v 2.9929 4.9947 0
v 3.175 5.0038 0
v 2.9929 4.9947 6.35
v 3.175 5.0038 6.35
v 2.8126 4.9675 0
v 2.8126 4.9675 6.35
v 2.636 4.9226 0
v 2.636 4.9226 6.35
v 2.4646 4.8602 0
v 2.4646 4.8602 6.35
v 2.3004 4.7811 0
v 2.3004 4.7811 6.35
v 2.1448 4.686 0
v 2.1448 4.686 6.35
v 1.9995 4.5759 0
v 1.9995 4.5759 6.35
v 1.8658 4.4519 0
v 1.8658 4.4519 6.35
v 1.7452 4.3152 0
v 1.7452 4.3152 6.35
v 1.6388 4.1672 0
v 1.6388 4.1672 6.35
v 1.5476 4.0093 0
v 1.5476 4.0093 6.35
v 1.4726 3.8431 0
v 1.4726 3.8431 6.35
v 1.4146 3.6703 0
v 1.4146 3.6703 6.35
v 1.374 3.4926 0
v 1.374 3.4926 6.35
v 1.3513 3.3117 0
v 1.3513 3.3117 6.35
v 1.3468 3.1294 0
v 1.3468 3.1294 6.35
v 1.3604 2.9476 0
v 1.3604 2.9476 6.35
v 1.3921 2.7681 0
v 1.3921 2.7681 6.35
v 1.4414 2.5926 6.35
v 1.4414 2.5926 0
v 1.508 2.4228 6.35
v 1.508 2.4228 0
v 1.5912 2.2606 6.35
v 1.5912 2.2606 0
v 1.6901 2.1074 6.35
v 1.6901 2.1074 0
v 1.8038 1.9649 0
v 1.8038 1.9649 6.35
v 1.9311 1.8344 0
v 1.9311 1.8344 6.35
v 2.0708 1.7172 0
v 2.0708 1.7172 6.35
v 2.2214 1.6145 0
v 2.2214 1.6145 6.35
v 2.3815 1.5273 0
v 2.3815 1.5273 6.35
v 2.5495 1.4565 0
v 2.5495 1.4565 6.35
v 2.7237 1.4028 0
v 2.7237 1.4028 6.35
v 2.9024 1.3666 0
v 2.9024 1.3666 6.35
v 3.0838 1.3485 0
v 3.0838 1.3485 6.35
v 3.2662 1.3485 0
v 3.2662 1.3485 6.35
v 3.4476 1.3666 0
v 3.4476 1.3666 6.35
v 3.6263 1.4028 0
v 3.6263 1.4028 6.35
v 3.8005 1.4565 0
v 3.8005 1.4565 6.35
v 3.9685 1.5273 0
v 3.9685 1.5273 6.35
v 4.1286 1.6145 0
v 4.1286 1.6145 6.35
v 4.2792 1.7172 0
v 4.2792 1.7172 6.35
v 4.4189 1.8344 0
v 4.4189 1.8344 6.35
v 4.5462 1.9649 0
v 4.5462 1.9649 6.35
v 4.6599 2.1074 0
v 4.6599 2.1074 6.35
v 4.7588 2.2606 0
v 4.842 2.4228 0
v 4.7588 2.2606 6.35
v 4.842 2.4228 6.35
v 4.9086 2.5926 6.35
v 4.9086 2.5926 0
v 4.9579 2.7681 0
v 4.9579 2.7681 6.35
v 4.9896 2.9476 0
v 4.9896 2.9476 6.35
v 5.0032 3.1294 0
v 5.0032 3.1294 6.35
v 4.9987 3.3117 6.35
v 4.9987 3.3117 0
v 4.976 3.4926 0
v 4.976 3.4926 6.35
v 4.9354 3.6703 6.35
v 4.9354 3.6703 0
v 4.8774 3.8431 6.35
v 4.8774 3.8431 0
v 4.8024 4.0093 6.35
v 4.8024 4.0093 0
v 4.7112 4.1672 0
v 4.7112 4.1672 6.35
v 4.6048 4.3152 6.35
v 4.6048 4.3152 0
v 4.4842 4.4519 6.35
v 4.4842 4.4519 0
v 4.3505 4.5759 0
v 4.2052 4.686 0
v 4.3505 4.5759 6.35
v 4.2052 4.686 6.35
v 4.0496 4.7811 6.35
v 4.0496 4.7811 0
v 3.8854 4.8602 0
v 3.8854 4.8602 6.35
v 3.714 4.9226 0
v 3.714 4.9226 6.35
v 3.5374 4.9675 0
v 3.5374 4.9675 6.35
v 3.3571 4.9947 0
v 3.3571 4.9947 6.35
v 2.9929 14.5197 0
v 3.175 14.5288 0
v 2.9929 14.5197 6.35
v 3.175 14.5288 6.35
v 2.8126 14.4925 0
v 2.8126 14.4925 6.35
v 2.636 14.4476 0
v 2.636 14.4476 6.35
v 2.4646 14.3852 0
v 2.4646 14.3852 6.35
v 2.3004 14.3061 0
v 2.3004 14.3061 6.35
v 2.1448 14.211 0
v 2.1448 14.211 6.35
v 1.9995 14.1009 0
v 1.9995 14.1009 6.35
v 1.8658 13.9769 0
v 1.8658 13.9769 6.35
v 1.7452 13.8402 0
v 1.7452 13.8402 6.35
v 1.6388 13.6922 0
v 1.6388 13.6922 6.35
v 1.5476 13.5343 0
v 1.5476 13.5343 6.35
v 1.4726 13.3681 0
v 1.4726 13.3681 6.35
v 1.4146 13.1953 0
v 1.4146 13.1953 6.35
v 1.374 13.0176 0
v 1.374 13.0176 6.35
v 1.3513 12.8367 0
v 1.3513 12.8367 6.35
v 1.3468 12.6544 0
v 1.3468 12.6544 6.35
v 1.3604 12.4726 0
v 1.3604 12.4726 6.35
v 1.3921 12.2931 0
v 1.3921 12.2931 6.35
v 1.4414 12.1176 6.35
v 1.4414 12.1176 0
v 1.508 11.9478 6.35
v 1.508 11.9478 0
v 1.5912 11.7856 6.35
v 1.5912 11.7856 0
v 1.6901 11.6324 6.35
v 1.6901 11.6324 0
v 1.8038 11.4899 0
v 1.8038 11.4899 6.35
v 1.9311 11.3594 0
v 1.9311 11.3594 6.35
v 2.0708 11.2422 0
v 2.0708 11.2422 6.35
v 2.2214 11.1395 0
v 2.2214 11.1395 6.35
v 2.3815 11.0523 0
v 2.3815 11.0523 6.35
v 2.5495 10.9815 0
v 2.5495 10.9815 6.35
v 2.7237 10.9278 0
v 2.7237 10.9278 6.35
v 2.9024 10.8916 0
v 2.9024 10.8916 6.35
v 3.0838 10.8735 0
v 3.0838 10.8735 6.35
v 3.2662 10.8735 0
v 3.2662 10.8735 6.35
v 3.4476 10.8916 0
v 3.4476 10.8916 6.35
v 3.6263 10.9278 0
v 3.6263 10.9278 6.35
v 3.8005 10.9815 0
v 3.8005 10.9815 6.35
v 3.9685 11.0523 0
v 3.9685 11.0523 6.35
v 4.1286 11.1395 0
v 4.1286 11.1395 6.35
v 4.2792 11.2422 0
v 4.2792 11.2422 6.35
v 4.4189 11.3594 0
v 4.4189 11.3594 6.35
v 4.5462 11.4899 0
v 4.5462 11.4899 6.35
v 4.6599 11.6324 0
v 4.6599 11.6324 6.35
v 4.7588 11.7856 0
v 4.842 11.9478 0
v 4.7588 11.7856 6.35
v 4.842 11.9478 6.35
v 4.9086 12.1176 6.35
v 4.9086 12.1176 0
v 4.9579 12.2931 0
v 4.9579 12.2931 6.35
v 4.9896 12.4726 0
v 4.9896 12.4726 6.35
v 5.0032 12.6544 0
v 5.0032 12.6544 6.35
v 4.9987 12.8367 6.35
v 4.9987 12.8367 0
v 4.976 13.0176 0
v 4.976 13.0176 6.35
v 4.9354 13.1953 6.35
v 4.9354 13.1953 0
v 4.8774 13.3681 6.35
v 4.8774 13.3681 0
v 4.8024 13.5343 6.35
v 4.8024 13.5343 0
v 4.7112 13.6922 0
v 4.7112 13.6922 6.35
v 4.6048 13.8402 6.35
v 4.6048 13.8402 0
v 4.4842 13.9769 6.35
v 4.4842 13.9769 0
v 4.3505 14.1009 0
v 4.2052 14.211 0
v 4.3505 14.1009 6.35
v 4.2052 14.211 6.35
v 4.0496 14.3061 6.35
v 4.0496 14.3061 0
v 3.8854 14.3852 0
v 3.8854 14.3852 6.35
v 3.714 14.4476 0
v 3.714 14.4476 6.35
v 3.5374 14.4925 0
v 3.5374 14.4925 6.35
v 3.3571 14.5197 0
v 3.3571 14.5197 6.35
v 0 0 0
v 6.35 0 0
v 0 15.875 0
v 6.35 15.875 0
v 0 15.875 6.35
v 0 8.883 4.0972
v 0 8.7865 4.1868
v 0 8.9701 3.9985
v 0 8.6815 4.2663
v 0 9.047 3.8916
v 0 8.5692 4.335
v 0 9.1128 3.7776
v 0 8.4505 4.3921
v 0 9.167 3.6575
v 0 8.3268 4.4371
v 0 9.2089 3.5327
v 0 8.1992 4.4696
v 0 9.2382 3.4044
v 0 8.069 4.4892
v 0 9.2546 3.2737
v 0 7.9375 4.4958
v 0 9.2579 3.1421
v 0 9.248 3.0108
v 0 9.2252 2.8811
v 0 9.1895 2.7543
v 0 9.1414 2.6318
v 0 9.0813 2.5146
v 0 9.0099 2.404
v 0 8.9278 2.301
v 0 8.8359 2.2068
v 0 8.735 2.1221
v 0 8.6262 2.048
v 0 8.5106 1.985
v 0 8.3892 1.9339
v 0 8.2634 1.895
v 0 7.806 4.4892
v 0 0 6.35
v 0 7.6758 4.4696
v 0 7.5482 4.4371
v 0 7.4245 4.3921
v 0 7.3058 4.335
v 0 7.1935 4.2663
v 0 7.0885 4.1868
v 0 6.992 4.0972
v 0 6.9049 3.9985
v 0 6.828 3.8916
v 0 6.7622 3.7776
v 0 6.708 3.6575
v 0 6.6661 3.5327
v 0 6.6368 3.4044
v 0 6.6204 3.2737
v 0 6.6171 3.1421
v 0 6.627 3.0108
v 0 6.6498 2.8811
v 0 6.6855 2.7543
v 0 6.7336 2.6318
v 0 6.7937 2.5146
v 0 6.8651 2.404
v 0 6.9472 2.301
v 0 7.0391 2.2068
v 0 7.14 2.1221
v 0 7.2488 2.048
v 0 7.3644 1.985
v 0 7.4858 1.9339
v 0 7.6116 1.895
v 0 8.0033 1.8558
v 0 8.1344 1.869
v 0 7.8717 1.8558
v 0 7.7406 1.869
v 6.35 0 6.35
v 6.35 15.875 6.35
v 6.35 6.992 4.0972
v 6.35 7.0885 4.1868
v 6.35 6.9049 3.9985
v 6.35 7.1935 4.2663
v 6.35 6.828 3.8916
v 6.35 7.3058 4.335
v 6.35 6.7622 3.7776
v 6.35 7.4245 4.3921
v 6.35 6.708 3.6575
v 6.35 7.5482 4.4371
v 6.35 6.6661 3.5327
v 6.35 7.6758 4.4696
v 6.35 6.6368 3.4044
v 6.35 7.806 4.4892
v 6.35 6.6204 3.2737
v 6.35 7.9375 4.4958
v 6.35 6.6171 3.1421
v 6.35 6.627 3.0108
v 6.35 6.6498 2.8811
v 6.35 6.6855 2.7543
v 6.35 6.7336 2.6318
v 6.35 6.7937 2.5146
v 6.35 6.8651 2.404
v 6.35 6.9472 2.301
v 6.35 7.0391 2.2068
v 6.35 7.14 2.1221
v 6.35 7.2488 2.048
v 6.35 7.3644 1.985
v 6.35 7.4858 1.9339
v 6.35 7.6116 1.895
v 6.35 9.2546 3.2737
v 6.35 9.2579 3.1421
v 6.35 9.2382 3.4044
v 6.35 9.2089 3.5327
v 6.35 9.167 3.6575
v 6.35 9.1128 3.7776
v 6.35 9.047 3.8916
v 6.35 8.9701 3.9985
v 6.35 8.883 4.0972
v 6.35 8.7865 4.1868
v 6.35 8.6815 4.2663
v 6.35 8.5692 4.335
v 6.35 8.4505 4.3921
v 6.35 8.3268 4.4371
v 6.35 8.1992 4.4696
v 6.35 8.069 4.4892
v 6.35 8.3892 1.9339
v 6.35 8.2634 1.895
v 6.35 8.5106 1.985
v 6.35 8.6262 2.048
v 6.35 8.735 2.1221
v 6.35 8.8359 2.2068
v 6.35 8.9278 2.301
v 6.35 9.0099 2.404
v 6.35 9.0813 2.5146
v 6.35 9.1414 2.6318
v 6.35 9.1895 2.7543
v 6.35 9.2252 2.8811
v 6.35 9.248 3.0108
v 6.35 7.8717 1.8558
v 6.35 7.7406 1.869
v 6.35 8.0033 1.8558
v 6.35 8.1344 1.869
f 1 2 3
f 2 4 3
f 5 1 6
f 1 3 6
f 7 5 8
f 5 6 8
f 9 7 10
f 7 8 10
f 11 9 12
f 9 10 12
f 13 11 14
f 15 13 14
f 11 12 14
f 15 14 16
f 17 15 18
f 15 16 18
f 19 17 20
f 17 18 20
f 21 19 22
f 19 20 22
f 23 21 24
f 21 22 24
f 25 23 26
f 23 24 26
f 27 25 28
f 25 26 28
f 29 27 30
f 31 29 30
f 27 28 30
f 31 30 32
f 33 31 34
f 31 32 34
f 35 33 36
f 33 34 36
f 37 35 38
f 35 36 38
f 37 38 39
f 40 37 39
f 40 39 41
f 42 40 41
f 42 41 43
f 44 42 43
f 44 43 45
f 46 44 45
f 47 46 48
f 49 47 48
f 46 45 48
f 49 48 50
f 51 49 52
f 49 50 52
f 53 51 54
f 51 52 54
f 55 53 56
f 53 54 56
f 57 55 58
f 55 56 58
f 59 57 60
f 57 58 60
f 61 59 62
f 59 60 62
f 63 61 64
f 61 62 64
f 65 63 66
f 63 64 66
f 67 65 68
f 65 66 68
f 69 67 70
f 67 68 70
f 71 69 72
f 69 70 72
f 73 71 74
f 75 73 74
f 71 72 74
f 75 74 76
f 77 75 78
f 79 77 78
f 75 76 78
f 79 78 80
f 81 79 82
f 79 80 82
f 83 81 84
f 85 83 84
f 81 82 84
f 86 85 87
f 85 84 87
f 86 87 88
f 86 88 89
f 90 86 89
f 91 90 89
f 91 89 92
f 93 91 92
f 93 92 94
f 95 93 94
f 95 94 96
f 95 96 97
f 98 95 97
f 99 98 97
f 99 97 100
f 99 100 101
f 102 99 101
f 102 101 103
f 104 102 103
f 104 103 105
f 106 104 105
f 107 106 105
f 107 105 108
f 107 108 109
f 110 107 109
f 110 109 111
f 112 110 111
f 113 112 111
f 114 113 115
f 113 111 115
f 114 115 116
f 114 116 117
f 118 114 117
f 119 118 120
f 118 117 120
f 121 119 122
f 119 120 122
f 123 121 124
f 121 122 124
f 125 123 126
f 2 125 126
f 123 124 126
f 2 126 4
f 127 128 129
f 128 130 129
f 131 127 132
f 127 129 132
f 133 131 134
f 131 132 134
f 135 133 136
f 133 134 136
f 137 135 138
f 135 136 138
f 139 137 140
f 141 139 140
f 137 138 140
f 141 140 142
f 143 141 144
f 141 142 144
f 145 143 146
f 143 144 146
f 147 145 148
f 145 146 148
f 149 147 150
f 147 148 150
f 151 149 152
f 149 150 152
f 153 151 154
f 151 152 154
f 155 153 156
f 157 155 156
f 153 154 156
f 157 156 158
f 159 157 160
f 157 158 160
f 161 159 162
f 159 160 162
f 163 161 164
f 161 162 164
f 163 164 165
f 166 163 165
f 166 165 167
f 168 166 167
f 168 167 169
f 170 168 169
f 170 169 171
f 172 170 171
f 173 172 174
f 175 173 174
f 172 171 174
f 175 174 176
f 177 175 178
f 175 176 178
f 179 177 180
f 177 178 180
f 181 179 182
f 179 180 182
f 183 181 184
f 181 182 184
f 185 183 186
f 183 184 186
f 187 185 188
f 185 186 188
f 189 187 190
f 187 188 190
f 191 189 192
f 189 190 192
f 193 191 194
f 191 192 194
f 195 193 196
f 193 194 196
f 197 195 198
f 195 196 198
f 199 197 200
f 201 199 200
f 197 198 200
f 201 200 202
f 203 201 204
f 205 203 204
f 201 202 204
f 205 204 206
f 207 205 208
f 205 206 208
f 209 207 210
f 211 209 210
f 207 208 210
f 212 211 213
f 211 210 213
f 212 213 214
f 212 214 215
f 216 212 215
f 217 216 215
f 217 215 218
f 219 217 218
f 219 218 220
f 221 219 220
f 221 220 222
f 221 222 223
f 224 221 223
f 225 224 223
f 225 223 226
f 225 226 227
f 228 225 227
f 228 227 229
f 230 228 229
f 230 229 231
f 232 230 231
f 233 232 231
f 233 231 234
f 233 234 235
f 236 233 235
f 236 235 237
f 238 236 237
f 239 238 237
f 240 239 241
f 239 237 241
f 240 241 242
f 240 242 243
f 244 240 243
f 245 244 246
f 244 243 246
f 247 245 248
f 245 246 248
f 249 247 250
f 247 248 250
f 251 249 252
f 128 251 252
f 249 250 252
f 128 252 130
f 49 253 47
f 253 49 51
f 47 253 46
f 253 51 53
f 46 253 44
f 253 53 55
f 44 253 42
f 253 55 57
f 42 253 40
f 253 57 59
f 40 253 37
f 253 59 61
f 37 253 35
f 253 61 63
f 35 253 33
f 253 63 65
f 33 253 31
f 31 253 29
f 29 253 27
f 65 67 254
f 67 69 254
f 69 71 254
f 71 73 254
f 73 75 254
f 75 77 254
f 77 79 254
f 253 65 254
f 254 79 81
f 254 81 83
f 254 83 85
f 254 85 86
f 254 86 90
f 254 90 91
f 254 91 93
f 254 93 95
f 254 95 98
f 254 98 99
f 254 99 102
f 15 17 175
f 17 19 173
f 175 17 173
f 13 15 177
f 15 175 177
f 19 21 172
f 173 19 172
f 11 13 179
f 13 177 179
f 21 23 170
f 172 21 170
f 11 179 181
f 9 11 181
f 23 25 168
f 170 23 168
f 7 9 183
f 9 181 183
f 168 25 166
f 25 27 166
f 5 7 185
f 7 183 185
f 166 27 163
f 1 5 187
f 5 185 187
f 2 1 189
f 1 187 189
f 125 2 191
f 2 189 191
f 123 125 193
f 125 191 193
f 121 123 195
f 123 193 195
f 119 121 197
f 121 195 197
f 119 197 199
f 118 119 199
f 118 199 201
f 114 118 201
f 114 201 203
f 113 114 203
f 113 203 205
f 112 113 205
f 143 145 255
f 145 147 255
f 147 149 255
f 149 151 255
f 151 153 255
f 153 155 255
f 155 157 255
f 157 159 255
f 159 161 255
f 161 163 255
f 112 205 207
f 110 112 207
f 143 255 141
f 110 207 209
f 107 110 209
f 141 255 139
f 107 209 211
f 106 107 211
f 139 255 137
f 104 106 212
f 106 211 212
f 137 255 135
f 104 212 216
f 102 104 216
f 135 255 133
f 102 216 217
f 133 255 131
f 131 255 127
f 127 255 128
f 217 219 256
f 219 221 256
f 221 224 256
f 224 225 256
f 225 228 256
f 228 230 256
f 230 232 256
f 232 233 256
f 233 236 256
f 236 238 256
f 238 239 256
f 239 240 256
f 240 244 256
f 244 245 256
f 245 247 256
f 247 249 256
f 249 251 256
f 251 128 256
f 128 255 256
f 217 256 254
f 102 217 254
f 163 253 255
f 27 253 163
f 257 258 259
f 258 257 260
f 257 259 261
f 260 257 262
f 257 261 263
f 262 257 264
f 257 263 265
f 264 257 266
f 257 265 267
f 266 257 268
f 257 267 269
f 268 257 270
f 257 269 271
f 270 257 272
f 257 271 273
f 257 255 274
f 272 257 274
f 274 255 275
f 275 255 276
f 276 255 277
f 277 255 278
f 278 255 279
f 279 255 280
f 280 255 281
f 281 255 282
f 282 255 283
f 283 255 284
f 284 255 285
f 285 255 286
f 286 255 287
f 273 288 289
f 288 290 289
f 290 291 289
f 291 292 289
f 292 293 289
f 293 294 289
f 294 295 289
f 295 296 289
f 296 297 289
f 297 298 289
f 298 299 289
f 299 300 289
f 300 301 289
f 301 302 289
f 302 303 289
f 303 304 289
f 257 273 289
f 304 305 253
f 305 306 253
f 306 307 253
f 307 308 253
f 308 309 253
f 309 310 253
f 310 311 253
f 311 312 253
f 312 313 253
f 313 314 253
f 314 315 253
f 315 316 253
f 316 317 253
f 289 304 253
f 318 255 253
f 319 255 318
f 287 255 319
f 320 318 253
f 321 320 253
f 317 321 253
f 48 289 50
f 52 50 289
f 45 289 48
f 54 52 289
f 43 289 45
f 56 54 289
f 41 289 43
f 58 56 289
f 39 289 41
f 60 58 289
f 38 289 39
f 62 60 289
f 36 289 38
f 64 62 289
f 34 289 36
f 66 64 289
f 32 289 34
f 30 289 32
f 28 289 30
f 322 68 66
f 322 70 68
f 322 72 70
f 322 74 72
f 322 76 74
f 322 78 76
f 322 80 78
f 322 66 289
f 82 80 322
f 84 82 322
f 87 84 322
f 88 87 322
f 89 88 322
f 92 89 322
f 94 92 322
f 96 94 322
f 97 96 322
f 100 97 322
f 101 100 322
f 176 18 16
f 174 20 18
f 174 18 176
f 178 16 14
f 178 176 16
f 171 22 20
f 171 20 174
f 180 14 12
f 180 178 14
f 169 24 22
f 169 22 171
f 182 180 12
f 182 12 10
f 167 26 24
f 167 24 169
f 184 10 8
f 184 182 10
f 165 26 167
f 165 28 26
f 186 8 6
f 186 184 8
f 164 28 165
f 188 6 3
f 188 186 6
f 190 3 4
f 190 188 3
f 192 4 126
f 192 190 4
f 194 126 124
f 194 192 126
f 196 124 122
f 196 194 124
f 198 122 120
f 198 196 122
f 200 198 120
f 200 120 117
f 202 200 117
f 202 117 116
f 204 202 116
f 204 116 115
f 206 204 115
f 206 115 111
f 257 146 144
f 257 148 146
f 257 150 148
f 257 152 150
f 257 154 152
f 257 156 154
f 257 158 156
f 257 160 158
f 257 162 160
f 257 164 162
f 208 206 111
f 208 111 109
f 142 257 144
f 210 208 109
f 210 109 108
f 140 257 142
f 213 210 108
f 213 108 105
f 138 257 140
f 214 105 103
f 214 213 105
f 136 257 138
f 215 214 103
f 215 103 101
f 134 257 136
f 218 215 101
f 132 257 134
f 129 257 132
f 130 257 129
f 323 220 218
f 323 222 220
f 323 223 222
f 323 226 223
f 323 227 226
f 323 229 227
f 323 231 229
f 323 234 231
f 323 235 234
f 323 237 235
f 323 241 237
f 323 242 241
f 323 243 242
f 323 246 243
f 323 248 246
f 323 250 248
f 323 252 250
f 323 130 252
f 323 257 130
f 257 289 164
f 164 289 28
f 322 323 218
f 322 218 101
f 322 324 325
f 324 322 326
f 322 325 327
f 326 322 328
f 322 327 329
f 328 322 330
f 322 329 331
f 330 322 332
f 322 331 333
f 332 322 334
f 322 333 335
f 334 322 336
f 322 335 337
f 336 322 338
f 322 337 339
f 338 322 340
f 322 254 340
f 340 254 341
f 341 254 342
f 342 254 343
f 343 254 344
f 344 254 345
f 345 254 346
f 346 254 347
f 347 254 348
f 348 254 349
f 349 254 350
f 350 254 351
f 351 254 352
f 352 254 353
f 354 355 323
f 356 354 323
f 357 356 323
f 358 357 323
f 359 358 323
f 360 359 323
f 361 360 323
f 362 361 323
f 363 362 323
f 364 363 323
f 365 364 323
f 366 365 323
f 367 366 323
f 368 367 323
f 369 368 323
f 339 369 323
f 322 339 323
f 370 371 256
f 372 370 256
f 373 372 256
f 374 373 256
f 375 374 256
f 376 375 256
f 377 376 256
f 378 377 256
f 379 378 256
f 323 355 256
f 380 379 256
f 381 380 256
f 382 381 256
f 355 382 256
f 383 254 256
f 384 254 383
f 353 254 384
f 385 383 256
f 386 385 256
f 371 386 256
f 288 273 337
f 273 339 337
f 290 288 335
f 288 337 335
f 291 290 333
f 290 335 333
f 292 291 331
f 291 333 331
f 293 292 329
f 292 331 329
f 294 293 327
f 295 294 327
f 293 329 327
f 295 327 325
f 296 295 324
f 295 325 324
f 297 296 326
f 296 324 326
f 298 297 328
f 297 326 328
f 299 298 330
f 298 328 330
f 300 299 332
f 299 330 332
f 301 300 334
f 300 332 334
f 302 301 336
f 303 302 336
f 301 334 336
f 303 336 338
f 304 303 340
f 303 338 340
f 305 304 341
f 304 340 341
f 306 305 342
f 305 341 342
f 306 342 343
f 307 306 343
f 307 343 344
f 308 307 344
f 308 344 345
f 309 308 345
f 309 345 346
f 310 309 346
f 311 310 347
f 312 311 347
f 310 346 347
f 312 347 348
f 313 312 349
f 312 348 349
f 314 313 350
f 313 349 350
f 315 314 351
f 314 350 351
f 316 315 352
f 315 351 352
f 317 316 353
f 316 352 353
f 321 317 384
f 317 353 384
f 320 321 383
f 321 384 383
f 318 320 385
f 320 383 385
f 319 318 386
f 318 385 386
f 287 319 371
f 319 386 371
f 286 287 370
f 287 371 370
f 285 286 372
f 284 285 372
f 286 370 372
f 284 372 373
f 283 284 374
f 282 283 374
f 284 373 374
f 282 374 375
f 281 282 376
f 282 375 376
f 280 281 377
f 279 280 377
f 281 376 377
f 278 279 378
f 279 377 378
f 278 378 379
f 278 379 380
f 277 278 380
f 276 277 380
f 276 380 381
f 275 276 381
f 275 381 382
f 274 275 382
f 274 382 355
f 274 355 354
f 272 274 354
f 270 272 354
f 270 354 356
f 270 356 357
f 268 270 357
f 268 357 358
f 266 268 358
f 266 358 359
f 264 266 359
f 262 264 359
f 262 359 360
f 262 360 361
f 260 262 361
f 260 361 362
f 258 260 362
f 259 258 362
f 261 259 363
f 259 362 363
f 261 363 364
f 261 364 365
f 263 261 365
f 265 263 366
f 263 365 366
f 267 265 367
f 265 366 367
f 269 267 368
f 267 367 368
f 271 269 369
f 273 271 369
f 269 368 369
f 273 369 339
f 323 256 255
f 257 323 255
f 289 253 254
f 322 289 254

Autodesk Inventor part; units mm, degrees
ref_plane "YZ Plane" through (0, 0, 0) normal (1, 0, 0) x (0, 1, 0)
ref_plane "XZ Plane" through (0, 0, 0) normal (0, 1, 0) x (-1, 0, 0)
ref_plane "XY Plane" through (0, 0, 0) normal (0, 0, 1) x (1, 0, 0)
sketch "Sketch1" plane through (0, 0, 0) normal (0, 0, 1) x (1, 0, 0)
  line L0 (0, 0) -> (6.35, 0)
  line L1 (6.35, 0) -> (6.35, 15.875)
  line L2 (6.35, 15.875) -> (0, 15.875)
  line L3 (0, 15.875) -> (0, 0)
  line L4 (3.175, 15.875) -> (3.175, 0) construction
  point P0 (3.175, 12.7)
  point P1 (3.175, 3.175)
  dimension "d0" = 6.35
  dimension "d1" = 15.875
  dimension "d2" = 3.175
  dimension "d3" = 3.175
extrude "Extrusion1" add sketch "Sketch1" along normal blind 6.35
hole "Hole1" at (3.175, 12.7, 0) at (3.175, 3.175, 0) direction (0, 0, 1) diameter 3.6576 end through all clearance for "Flat Head Machine Screw (82)" size "#6" standard "Ansi Unified Screw Threads"
sketch "Sketch2" plane through (0, 0, 0) normal (-1, 0, 0) x (0, 0, 1)
  line L0 (6.35, 15.875) -> (6.35, 0) projected
  line L1 (0, 15.875) -> (6.35, 15.875) projected
  point P0 (3.175, 7.9375)
  dimension "d13" = 3.175
  dimension "d14" = 7.9375
hole "Hole2" at (0, 7.9375, 3.175) direction (1, 0, 0) diameter 2.6416 end through all thread size "6-32 UNC" class "2B" standard "ANSI Unified Screw Threads"
equation "\"d3\" = d2"
properties part number "Cim Adjustment Block"
